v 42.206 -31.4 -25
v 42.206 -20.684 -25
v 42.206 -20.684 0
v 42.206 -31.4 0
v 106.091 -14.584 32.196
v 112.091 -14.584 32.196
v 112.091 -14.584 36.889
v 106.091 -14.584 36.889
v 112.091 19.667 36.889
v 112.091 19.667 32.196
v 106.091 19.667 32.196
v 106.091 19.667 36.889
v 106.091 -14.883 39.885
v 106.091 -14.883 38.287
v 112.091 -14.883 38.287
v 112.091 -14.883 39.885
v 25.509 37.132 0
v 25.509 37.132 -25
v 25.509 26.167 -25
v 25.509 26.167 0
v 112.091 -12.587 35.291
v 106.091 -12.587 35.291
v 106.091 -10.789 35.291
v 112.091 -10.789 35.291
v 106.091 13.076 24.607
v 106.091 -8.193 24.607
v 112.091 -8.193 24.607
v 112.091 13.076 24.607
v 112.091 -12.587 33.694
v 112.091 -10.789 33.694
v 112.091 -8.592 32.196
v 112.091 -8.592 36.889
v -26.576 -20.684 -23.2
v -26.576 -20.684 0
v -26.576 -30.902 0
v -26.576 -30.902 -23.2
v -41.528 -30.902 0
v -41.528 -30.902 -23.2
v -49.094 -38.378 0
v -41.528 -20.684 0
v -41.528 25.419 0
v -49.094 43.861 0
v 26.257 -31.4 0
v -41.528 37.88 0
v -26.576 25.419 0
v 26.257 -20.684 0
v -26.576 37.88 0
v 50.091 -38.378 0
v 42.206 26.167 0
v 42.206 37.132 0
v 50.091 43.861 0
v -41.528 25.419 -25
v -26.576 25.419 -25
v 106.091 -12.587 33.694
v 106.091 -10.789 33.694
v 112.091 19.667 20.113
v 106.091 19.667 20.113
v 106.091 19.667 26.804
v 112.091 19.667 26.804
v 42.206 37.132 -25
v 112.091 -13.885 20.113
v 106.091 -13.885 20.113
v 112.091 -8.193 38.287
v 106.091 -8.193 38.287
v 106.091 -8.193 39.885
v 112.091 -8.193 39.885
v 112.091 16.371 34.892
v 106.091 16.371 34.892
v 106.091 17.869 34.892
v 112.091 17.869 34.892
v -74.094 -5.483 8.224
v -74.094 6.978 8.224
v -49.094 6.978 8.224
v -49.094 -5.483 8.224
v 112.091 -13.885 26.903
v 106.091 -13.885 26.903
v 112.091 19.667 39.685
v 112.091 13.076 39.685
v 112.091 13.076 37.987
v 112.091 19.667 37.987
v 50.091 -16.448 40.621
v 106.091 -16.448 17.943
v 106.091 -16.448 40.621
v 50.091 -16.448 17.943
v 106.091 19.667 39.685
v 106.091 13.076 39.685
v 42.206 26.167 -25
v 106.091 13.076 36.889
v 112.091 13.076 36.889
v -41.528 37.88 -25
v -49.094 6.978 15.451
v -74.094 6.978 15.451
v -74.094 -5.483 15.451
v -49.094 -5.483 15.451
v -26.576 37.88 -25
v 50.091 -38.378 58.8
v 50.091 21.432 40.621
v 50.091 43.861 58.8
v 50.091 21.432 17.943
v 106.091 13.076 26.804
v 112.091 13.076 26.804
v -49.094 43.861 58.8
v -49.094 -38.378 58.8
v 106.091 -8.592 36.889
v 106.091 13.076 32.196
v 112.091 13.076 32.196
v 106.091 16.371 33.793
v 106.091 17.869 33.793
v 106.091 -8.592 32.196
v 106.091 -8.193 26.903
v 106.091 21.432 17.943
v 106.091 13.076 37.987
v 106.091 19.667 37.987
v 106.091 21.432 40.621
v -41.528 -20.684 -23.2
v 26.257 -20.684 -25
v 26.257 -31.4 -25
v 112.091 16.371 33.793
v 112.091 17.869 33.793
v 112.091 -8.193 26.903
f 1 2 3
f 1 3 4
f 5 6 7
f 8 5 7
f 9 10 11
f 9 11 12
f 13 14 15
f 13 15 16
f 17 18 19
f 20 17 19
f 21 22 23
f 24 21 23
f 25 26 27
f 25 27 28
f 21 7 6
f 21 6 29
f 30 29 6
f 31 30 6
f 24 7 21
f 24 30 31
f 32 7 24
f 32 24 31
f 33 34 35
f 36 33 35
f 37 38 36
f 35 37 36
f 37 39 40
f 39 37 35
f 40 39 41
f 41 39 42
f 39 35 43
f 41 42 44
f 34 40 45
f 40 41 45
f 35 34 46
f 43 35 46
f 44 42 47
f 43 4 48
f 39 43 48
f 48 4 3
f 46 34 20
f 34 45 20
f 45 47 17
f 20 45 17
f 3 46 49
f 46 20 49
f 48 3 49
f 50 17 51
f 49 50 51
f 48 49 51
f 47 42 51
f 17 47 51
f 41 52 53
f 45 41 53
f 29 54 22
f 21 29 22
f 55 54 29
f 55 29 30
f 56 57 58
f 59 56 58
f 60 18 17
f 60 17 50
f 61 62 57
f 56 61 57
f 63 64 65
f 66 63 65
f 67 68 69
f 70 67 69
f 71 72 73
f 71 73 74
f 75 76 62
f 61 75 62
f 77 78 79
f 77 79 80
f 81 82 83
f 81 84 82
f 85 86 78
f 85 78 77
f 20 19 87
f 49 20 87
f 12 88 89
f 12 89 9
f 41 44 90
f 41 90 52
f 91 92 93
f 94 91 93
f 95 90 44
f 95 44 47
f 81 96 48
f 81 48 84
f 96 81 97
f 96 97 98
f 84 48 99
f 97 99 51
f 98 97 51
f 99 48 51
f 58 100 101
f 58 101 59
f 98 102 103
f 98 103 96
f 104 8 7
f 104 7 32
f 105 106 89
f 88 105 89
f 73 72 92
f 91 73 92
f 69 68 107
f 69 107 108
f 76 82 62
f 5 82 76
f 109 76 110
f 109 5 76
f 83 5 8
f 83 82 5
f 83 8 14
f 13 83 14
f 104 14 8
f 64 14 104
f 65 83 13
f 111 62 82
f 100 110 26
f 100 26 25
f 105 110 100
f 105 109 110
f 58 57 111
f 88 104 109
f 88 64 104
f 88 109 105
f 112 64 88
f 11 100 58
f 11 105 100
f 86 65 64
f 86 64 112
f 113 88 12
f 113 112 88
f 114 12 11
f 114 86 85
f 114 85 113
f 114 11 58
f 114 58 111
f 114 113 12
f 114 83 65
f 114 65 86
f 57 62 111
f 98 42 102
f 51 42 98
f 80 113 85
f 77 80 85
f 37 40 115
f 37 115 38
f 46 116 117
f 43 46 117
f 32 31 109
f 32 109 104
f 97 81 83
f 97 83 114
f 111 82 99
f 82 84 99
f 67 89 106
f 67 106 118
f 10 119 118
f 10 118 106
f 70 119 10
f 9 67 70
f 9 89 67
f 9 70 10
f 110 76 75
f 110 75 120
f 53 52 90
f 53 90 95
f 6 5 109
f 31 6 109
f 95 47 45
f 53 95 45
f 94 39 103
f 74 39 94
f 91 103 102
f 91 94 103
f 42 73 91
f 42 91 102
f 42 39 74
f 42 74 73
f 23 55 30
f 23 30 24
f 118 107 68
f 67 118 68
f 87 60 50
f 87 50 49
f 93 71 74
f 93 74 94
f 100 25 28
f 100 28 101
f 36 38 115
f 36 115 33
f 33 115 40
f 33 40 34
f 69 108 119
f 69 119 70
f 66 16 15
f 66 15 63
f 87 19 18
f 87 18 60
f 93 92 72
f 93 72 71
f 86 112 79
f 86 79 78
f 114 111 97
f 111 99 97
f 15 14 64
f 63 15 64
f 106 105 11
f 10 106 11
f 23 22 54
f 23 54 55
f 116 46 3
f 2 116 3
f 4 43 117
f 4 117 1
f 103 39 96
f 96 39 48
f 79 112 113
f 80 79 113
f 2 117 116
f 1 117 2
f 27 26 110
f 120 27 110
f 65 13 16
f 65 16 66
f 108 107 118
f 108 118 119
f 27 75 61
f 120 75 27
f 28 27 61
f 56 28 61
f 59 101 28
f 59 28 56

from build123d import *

# Parameters (mm, degrees)
F0_W      = 99.1851314902
F0_H      = 82.2389237583
F1_DEPTH  = 58.8
F2_W      = 37.8797464073
F2_H      = 22.678008303
F3_DEPTH  = 53
F4_W      = 14.9525329471
F4_H      = 10.2175623178
F5_DEPTH  = 23.2
F6_W      = 15.9493666142
F6_H      = 10.7159819454
F6_W_2    = 16.6969913989
F6_H_2    = 10.9651889652
F6_W_3    = 14.9525329471
F6_H_3    = 12.4604459852
F7_DEPTH  = 25
F8_W      = 37.8797464073
F8_H      = 22.678008303
F9_DEPTH  = 3
F10_W     = 5.9913191944
F10_H     = 4.6931989491
F10_W_2   = 1.7973957583
F10_H_2   = 1.597687602
F10_W_3   = 6.5904529765
F10_W_4   = 1.497827936
F10_H_3   = 1.0984092951
F10_W_5   = 5.6917527691
F10_H_4   = 2.2966712713
F10_H_5   = 4.4934898615
F10_W_6   = 21.2691789493
F10_H_6   = 2.1968167275
F10_W_7   = 6.690306589
F10_H_7   = 1.5976838768
F10_H_8   = 1.6975402832
F11_DEPTH = 6
F12_W     = 12.4604427256
F12_H     = 7.2270575911
F13_DEPTH = 25


with BuildPart() as f1:
    # F0 (on Top) → F1 (new body)
    with BuildSketch(Plane.XY):
        with Locations((0.4984177649, 2.741297707)):
            Rectangle(F0_W, F0_H)
    extrude(amount=F1_DEPTH)

    # F2 (on face) → F3 (join)
    with BuildSketch(Plane.YZ.offset(50.09098351)):
        with Locations((2.4920888245, 29.2820418254)):
            Rectangle(F2_W, F2_H)
    extrude(amount=F3_DEPTH)

    # F4 (on face) → F5 (join)
    with BuildSketch(Plane(origin=(0, 0, 0), x_dir=(1, 0, 0), z_dir=(0, 0, -1))):
        with Locations((-34.0518206358, 25.7931184024)):
            Rectangle(F4_W, F4_H)
    extrude(amount=F5_DEPTH)

    # F6 (on face) → F7 (join)
    with BuildSketch(Plane(origin=(0, 0, 0), x_dir=(1, 0, 0), z_dir=(0, 0, -1))):
        with Locations((34.2314103618, 26.0423282161)):
            Rectangle(F6_W, F6_H)
        with Locations((33.8575979695, -31.64952714)):
            Rectangle(F6_W_2, F6_H_2)
        with Locations((-34.0518206358, -31.64952714)):
            Rectangle(F6_W_3, F6_H_3)
    extrude(amount=F7_DEPTH)

    # F8 (on face) → F9 (join)
    with BuildSketch(Plane.YZ.offset(103.09098351)):
        with Locations((2.4920888245, 29.2820418254)):
            Rectangle(F8_W, F8_H)
    extrude(amount=F9_DEPTH)

    # F10 (on face) → F11 (join)
    with BuildSketch(Plane.YZ.offset(106.09098351)):
        with Locations((-11.5880584344, 34.5423240215)):
            Rectangle(F10_W, F10_H)
        with Locations((-11.6879125126, 34.4923958182)):
            Rectangle(F10_W_2, F10_H_2, mode=Mode.SUBTRACT)
        with Locations((16.3714285009, 34.5423240215)):
            Rectangle(F10_W_3, F10_H)
        with Locations((17.1203424688, 34.3426130712)):
            Rectangle(F10_W_4, F10_H_3, mode=Mode.SUBTRACT)
        with Locations((-11.0388533212, 25.7550571114)):
            Rectangle(F10_W_5, F10_H_4)
        with Locations((-11.0388533212, 22.359976545)):
            Rectangle(F10_W_5, F10_H_5)
        with Locations((2.441612538, 22.359976545)):
            Rectangle(F10_W_6, F10_H_5)
        with Locations((16.3714285009, 25.7051298395)):
            Rectangle(F10_W_3, F10_H_6)
        with Locations((16.3714285009, 22.359976545)):
            Rectangle(F10_W_3, F10_H_5)
        with Locations((-11.5381302312, 39.0857402235)):
            Rectangle(F10_W_7, F10_H_7)
        with Locations((16.3714285009, 38.8361029327)):
            Rectangle(F10_W_3, F10_H_8)
    extrude(amount=F11_DEPTH)

    # F12 (on face) → F13 (join)
    with BuildSketch(Plane(origin=(-49.0941479802, 0, 0), x_dir=(0, -1, 0), z_dir=(-1, 0, 0))):
        with Locations((-0.7476268802, 11.8374209851)):
            Rectangle(F12_W, F12_H)
    extrude(amount=F13_DEPTH)


solid = f1.part
